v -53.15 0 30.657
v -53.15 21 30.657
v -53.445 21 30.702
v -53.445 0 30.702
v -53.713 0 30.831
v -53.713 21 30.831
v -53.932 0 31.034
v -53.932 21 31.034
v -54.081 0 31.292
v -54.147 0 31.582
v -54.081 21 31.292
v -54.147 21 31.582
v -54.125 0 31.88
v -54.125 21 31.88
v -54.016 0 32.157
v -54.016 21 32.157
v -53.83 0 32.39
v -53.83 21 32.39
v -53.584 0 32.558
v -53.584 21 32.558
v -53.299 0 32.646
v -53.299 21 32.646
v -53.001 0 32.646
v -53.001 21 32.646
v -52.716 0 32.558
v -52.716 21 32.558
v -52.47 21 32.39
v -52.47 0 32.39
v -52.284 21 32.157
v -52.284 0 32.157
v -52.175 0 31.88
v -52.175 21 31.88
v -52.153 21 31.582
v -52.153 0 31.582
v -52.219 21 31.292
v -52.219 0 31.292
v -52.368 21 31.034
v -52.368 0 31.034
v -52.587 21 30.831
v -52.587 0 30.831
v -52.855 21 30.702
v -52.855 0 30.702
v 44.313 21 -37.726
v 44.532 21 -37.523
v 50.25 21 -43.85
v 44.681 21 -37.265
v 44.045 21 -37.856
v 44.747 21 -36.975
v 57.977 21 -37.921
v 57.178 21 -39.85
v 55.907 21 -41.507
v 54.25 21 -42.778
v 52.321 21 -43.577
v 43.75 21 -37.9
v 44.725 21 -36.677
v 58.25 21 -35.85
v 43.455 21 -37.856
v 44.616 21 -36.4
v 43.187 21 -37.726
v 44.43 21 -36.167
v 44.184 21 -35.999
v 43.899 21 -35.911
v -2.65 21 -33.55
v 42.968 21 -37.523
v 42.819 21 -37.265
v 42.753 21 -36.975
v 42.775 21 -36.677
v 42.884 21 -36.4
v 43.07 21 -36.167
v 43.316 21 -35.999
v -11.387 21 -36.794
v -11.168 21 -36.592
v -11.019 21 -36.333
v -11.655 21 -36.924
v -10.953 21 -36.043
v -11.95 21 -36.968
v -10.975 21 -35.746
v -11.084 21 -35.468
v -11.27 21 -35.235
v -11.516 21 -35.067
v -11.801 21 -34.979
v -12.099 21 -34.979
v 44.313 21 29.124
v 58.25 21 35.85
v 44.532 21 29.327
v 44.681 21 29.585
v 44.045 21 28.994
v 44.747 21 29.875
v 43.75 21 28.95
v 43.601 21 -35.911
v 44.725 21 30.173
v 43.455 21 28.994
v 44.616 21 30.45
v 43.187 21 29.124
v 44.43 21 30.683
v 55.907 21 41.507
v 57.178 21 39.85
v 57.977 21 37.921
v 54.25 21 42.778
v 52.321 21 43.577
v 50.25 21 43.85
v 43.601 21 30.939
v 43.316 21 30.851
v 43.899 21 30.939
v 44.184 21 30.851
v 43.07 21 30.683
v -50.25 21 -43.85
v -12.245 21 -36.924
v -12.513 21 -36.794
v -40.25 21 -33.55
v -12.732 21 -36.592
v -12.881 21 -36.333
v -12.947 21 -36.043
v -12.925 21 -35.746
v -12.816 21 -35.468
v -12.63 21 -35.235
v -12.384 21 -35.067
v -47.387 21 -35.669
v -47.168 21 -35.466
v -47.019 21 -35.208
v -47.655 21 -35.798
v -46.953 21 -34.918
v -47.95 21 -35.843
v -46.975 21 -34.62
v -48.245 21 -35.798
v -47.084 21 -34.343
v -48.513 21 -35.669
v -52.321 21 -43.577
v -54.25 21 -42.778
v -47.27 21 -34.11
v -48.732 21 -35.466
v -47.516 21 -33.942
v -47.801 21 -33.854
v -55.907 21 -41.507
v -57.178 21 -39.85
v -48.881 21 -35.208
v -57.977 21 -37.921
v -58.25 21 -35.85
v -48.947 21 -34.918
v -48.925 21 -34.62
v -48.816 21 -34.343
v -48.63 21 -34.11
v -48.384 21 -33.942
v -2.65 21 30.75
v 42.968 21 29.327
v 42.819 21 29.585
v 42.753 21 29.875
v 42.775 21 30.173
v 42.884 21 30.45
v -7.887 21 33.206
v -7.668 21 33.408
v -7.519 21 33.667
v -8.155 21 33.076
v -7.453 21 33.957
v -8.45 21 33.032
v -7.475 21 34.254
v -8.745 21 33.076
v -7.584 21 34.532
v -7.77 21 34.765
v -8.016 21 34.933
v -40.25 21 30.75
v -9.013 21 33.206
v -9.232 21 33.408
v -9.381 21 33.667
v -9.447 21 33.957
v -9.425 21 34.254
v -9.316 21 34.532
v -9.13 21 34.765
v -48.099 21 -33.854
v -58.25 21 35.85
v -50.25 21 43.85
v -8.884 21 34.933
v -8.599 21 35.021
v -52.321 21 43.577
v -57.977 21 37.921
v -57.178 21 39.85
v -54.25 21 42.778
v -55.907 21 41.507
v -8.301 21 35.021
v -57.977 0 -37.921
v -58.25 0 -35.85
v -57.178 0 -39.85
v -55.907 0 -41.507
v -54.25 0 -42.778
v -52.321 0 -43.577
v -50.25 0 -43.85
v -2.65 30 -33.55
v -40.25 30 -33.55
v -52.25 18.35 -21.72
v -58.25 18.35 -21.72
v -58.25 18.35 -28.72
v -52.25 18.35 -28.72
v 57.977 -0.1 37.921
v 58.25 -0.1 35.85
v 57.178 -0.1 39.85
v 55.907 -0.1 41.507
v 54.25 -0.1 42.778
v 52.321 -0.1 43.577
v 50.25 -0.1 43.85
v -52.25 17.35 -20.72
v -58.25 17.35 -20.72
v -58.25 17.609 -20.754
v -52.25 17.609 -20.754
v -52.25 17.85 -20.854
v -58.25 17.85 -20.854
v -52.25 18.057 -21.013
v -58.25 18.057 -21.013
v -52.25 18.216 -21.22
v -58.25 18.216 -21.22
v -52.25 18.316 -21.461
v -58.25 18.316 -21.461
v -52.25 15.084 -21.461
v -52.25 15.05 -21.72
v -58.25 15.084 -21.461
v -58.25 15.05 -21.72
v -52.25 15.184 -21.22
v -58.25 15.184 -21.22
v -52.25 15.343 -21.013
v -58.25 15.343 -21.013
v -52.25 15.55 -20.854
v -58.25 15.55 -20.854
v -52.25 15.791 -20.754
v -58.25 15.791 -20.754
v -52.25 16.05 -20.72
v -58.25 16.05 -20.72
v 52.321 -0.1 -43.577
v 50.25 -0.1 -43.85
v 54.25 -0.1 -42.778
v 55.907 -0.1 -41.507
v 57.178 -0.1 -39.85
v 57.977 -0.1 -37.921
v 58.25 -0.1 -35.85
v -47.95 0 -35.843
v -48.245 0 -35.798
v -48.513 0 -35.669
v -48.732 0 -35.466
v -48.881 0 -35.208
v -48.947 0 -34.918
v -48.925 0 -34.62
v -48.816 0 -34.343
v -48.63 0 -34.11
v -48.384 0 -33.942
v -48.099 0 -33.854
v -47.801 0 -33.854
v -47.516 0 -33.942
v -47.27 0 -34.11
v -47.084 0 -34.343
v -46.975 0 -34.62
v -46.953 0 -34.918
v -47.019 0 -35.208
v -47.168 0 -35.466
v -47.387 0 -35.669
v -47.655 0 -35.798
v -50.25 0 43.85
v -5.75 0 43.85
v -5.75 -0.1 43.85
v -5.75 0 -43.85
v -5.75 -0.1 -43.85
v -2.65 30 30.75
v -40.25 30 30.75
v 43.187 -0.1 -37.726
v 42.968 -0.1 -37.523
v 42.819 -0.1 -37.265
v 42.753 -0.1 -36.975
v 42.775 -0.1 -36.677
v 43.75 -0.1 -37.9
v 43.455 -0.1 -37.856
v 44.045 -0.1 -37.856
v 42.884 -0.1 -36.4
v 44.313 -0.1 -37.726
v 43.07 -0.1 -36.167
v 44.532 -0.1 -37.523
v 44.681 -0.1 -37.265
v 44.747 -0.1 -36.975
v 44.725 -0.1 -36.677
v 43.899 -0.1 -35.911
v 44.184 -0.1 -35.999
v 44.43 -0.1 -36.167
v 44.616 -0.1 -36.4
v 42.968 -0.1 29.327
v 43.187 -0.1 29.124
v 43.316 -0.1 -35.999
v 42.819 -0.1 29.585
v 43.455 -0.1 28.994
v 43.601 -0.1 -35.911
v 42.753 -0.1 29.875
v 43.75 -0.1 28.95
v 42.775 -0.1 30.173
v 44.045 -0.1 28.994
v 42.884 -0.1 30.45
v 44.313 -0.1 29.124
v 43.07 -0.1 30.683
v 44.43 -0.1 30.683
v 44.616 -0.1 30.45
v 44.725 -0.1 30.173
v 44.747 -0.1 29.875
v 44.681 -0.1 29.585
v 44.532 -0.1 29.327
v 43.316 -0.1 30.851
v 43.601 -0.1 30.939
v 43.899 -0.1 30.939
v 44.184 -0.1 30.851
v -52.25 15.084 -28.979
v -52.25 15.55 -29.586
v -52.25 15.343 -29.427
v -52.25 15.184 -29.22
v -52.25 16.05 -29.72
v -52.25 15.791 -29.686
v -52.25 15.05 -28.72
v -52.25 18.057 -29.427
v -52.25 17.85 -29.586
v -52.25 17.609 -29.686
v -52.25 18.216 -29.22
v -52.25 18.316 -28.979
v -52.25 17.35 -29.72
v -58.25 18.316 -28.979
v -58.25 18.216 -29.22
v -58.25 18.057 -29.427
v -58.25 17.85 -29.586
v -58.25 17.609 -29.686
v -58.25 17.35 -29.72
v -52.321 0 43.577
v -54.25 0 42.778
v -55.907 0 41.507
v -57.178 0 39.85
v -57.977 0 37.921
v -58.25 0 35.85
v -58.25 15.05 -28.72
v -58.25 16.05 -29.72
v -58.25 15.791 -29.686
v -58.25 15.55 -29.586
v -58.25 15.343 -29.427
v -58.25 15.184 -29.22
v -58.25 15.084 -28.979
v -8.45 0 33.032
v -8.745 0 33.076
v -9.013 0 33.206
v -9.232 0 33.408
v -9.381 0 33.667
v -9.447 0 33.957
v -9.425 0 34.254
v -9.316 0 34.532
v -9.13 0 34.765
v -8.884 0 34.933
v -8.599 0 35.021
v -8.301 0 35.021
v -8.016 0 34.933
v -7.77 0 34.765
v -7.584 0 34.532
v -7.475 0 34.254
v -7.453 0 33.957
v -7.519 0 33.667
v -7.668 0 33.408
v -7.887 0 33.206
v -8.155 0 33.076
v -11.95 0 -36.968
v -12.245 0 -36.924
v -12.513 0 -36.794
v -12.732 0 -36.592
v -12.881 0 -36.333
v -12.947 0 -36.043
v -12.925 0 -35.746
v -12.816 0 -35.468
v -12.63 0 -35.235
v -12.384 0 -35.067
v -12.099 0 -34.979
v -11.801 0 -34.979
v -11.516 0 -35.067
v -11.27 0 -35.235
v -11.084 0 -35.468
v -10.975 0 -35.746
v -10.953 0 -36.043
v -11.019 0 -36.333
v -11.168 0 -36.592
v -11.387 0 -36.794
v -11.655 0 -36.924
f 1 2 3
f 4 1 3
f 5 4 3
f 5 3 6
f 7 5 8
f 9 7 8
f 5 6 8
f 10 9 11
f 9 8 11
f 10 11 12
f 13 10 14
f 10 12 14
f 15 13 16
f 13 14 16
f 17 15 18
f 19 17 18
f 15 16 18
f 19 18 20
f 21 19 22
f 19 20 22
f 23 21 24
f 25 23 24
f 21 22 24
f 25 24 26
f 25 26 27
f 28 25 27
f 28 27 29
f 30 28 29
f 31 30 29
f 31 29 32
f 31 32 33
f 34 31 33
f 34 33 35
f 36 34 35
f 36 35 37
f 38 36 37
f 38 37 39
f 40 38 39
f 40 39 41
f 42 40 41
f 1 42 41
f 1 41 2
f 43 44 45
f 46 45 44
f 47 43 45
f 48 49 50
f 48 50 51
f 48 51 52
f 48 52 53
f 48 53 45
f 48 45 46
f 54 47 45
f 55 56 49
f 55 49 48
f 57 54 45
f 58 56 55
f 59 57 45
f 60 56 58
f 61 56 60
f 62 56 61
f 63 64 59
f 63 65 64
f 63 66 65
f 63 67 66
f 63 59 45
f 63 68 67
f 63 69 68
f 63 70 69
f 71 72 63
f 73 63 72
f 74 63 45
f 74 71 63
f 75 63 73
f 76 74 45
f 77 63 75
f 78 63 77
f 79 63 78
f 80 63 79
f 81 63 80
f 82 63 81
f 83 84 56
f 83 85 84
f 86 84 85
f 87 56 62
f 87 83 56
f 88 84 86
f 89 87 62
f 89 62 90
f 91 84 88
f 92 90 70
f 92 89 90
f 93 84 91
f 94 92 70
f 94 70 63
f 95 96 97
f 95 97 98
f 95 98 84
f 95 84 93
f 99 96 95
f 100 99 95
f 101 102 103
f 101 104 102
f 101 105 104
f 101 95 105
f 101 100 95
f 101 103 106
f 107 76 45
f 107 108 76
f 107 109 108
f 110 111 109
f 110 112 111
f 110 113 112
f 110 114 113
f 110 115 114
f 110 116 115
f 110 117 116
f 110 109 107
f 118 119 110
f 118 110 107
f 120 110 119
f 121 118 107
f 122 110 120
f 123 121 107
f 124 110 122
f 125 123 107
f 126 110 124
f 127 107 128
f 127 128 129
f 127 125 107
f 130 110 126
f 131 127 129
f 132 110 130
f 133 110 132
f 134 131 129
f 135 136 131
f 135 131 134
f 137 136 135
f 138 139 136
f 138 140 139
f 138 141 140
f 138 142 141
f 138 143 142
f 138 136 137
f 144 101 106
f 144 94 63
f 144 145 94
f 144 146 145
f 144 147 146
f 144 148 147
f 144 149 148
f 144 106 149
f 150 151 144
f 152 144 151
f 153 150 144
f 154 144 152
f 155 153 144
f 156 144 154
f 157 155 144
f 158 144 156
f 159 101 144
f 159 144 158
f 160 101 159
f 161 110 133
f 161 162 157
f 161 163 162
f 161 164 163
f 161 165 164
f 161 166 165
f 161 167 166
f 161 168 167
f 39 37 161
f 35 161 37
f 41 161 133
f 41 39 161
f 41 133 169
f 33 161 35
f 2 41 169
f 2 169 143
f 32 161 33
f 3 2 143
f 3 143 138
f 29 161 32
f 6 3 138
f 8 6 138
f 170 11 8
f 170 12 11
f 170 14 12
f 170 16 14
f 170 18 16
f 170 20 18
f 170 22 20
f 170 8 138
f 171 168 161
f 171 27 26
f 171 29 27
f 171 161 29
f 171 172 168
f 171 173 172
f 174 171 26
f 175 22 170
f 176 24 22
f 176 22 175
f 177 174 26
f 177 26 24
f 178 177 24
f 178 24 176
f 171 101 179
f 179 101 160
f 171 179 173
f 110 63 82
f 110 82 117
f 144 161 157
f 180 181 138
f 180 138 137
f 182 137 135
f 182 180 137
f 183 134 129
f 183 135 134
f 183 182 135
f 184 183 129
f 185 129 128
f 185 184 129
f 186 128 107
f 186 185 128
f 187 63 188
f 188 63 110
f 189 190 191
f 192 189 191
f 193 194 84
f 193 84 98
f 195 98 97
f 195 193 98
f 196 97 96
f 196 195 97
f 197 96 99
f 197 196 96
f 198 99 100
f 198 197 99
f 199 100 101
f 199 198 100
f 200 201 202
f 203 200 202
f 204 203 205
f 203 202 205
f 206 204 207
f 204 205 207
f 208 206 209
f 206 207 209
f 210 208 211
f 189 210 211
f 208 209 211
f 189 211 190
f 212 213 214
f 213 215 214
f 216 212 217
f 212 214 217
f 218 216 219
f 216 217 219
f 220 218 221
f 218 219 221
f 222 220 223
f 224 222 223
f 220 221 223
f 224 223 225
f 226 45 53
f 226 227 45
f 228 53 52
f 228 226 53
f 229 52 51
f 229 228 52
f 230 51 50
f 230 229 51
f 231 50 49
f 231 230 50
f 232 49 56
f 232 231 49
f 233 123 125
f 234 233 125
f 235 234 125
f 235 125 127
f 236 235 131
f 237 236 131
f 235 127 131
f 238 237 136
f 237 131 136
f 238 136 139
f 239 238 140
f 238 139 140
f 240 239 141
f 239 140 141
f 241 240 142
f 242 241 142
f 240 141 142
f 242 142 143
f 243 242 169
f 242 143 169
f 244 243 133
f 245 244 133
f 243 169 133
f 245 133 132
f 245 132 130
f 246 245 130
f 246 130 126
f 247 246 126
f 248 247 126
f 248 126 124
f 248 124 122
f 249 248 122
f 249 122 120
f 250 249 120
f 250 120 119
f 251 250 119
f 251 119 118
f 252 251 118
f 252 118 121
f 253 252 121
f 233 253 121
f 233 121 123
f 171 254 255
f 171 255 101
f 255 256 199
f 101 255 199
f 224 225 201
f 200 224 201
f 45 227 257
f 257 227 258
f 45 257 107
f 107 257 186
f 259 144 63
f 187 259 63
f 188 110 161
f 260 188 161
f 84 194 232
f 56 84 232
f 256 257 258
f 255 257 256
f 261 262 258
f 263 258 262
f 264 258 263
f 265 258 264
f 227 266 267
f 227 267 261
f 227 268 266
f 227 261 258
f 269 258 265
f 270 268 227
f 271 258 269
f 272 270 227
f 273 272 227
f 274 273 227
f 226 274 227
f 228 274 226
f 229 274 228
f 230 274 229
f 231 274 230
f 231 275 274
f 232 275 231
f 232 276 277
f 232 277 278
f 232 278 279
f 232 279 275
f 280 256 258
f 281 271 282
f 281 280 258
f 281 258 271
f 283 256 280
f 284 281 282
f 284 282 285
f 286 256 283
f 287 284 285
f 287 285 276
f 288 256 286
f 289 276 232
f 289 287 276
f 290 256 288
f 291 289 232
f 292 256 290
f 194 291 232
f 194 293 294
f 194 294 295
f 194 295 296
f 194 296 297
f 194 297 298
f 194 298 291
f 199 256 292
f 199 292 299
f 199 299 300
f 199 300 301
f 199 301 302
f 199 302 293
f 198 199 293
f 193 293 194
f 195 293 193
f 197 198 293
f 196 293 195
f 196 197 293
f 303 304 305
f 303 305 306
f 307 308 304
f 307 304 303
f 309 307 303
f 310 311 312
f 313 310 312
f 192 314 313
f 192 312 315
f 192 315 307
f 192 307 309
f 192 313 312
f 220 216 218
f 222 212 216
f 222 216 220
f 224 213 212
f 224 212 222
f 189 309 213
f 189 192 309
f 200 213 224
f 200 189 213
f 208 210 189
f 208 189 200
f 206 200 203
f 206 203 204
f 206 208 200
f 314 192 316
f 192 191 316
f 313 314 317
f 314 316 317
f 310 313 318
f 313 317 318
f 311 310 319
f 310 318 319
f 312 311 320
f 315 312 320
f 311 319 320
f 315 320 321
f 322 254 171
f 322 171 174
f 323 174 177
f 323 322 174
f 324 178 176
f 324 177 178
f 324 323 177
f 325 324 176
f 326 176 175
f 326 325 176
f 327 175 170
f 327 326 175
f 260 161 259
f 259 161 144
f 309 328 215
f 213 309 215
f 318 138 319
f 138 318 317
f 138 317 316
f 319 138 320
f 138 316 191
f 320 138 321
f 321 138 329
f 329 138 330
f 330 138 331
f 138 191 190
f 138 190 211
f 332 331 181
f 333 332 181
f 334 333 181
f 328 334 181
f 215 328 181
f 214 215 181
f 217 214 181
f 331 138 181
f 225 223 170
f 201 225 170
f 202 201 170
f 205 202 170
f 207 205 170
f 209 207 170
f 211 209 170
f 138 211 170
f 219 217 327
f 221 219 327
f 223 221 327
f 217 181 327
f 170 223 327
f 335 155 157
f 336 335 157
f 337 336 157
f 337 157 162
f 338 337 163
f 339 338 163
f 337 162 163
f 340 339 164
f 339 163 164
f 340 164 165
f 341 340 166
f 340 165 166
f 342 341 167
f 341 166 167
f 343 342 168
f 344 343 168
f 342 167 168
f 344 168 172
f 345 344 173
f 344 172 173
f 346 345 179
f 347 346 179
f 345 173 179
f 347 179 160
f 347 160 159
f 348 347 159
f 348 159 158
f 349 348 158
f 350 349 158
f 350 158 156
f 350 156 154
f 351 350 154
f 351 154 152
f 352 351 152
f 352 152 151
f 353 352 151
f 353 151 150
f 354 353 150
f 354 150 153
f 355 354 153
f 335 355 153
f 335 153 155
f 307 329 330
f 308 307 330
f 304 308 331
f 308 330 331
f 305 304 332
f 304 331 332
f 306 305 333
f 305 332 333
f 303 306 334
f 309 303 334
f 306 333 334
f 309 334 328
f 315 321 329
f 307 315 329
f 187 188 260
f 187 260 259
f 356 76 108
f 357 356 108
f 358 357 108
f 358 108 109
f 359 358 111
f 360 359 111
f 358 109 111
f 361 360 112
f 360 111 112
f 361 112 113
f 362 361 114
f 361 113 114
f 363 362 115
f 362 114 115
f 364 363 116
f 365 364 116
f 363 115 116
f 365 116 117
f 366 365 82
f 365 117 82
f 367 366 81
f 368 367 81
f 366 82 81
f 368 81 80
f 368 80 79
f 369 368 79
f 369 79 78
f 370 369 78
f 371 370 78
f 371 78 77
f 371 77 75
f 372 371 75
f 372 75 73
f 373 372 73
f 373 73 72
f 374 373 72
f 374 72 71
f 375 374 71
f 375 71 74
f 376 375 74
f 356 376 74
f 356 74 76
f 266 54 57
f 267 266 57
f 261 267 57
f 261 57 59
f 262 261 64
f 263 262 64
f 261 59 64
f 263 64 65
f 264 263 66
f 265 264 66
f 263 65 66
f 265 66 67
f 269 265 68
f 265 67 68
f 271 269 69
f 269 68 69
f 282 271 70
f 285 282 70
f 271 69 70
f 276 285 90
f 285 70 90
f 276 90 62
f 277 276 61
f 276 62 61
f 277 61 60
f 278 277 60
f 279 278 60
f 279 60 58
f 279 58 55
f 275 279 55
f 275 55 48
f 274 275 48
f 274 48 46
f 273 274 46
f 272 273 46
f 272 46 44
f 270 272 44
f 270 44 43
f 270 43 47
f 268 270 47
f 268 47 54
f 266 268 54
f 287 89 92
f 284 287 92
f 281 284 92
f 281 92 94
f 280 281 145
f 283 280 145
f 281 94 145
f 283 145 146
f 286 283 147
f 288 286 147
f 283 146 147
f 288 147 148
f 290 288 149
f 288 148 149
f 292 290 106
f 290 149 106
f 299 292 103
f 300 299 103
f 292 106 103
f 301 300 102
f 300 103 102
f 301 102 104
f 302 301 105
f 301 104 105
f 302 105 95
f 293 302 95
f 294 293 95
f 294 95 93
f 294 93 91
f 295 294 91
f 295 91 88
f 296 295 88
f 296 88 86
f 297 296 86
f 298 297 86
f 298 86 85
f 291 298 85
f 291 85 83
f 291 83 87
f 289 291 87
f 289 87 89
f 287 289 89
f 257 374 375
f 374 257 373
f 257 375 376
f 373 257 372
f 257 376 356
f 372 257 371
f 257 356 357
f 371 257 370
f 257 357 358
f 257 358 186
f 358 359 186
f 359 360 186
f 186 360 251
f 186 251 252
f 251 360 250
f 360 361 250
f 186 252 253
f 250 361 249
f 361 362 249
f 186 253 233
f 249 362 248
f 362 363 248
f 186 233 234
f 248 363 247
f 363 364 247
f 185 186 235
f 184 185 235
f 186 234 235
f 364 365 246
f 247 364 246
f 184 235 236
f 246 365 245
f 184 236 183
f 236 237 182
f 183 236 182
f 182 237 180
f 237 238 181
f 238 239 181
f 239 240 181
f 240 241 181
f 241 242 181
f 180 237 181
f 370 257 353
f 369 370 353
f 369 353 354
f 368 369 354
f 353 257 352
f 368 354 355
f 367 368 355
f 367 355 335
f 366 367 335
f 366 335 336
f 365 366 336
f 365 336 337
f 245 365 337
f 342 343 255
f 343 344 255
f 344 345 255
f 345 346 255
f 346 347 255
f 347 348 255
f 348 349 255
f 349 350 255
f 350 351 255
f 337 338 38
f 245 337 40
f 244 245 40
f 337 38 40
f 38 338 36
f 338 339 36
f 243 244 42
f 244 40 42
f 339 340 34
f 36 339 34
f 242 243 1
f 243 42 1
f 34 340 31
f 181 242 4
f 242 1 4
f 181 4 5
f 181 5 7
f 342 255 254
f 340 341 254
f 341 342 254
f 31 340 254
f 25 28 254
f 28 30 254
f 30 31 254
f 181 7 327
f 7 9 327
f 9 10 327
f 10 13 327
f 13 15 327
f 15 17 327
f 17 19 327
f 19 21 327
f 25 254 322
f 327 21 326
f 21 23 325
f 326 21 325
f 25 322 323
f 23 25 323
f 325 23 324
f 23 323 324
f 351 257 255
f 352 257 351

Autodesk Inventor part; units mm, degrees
ref_plane "YZ Plane" through (0, 0, 0) normal (1, 0, 0) x (0, 1, 0)
ref_plane "XZ Plane" through (0, 0, 0) normal (0, 1, 0) x (-1, 0, 0)
ref_plane "XY Plane" through (0, 0, 0) normal (0, 0, 1) x (1, 0, 0)
sketch "Skizze1" plane through (0, 0, 0) normal (0, 1, 0) x (-1, 0, 0)
  line L0 (50.25, 43.85) -> (-50.25, 43.85)
  line L1 (-58.25, 35.85) -> (-58.25, -35.85)
  line L2 (-50.25, -43.85) -> (50.25, -43.85)
  line L3 (58.25, -35.85) -> (58.25, 35.85)
  line L4 (58.25, 43.85) -> (-58.25, -43.85) construction
  line L5 (-58.25, 43.85) -> (58.25, -43.85) construction
  arc A0 (58.25, 35.85) -> (50.25, 43.85) centre (50.25, 35.85) ccw
  arc A1 (50.25, -43.85) -> (58.25, -35.85) centre (50.25, -35.85) ccw
  arc A2 (-58.25, -35.85) -> (-50.25, -43.85) centre (-50.25, -35.85) ccw
  arc A3 (-50.25, 43.85) -> (-58.25, 35.85) centre (-50.25, 35.85) ccw
  point P0 (0, 0)
  dimension "d0" = 116.5
  dimension "d1" = 87.7
  dimension "d2" = 8
extrude "Extrusion1" add sketch "Skizze1" along normal blind 21
sketch "Skizze2" plane through (0, 0, 0) normal (0, -1, 0) x (1, 0, 0)
  arc A0 (58.25, 35.85) -> (50.25, 43.85) centre (50.25, 35.85) ccw projected
  line L0 (-50.25, 43.85) -> (50.25, 43.85) projected
  arc A1 (-50.25, 43.85) -> (-58.25, 35.85) centre (-50.25, 35.85) ccw projected
  line L1 (-58.25, -35.85) -> (-58.25, 35.85) projected
  arc A2 (-58.25, -35.85) -> (-50.25, -43.85) centre (-50.25, -35.85) ccw projected
  line L2 (50.25, -43.85) -> (-50.25, -43.85) projected
  arc A3 (50.25, -43.85) -> (58.25, -35.85) centre (50.25, -35.85) ccw projected
  line L3 (58.25, 35.85) -> (58.25, -35.85) projected
  line L4 (50.25, -43.85) -> (-50.25, -43.85) projected
  line L5 (-5.75, -43.85) -> (-5.75, 43.85)
  point P0 (0, 0)
  dimension "d5" = 64
extrude "Extrusion2" add sketch "Skizze2" along normal blind 0.1 contours L3 A3 L2 L5 L0 A0
sketch "Skizze3" plane through (0, 21, 0) normal (0, 1, 0) x (1, 0, 0)
  line L0 (-40.25, -30.75) -> (-2.65, -30.75)
  line L1 (-2.65, -30.75) -> (-2.65, 33.55)
  line L2 (-2.65, 33.55) -> (-40.25, 33.55)
  line L3 (-40.25, 33.55) -> (-40.25, -30.75)
  line L4 (-40.25, -30.75) -> (-2.65, 33.55) construction
  line L5 (-2.65, -30.75) -> (-40.25, 33.55) construction
  line L6 (-50.25, -43.85) -> (50.25, -43.85) projected
  line L7 (50.25, 43.85) -> (-50.25, 43.85) projected
  line L8 (-58.25, 35.85) -> (-58.25, -35.85) projected
  point P0 (0, 0)
  point P1 (-21.45, 1.4)
  dimension "d8" = 37.6
  dimension "d9" = 64.3
  dimension "d10" = 13.1
  dimension "d11" = 10.3
  dimension "d12" = 18
extrude "Extrusion3" add sketch "Skizze3" along normal blind 9
sketch "Skizze4" plane through (0, -0.1, 0) normal (0, -1, 0) x (1, 0, 0)
  line L0 (50.25, 43.85) -> (-5.75, 43.85) projected
  line L1 (-5.75, 43.85) -> (-5.75, -43.85) projected
  line L2 (-5.75, -43.85) -> (50.25, -43.85) projected
  arc A0 (50.25, -43.85) -> (58.25, -35.85) centre (50.25, -35.85) ccw projected
  line L3 (58.25, -35.85) -> (58.25, 35.85) projected
  arc A1 (58.25, 35.85) -> (50.25, 43.85) centre (50.25, 35.85) ccw projected
  line L4 (-5.75, -43.85) -> (-5.75, 43.85) projected
  line L5 (-50.25, 43.85) -> (-5.75, 43.85) projected
  arc A2 (-50.25, 43.85) -> (-58.25, 35.85) centre (-50.25, 35.85) ccw projected
  line L6 (-58.25, -35.85) -> (-58.25, 35.85) projected
  arc A3 (-58.25, -35.85) -> (-50.25, -43.85) centre (-50.25, -35.85) ccw projected
  line L7 (-5.75, -43.85) -> (-50.25, -43.85) projected
  circle A4 centre (43.75, -36.9) radius 1.1
  circle A5 centre (43.75, 29.95) radius 1.1
  circle A6 centre (-11.95, -35.9681) radius 1.1
  circle A7 centre (-8.45, 34.0319) radius 1.1
  circle A8 centre (-47.95, -34.8429) radius 1.1
  circle A9 centre (-53.15, 31.6571) radius 1.1
  point P0 (0, 0)
  dimension "d15" = 2.2
  dimension "d16" = 2.2
  dimension "d17" = 2.2
  dimension "d18" = 2.2
  dimension "d19" = 2.2
  dimension "d20" = 2.2
  dimension "d21" = 0
  dimension "d22" = 66.85
  dimension "d23" = 70
  dimension "d24" = 66.5
  dimension "d25" = 52.2
  dimension "d26" = 44.7
  dimension "d27" = 36
  dimension "d28" = 55.7
  dimension "d29" = 118.7
  dimension "d30" = 112.2809
  dimension "d31" = 86.3
  dimension "d32" = 88.0691
  dimension "d33" = 79.3976
  dimension "d34" = 13.9
  dimension "d35" = 6.95
  dimension "d36" = 14.5
  dimension "d37" = 9.8181
  dimension "d38" = 7.8819
  dimension "d39" = 9.0071
  dimension "d40" = 12.1929
  dimension "d41" = 5.1
hole "Bohrung1" at (-11.95, -0.1, -35.9681) at (-47.95, -0.1, -34.8429) at (-53.15, -0.1, 31.6571) at (-8.45, -0.1, 34.0319) at (43.75, -0.1, 29.95) at (43.75, -0.1, -36.9) direction (0, 1, 0) diameter 2 end through all
sketch "Skizze5" plane through (-58.25, 0, -35.85) normal (-1, 0, 0) x (0, 0, 1)
  line L0 (0, 0) -> (71.7, 0) projected
  line L1 (71.7, 0) -> (71.7, 21) projected
  line L2 (0, 21) -> (71.7, 21) projected
  line L3 (0, 0) -> (0, 21) projected
  line L4 (14.13, 18.35) -> (7.13, 18.35)
  line L5 (6.13, 17.35) -> (6.13, 16.05)
  line L6 (7.13, 15.05) -> (14.13, 15.05)
  line L7 (15.13, 16.05) -> (15.13, 17.35)
  arc A0 (15.13, 17.35) -> (14.13, 18.35) centre (14.13, 17.35) ccw
  arc A1 (14.13, 15.05) -> (15.13, 16.05) centre (14.13, 16.05) ccw
  arc A2 (6.13, 16.05) -> (7.13, 15.05) centre (7.13, 16.05) ccw
  arc A3 (7.13, 18.35) -> (6.13, 17.35) centre (7.13, 17.35) ccw
  line L8 (-8, 0) -> (0, 0) projected
  line L9 (0, 0) -> (0, 21) projected
  line L10 (-8, 21) -> (0, 21) projected
  line L11 (-8, 0) -> (-8, 21) projected
  point P0 (35.85, 0)
  point P1 (6.13, 15.05)
  point P2 (6.13, 18.35)
  point P3 (15.13, 15.05)
  point P4 (6.13, 16.7)
  dimension "d49" = 9
  dimension "d50" = 3.3
  dimension "d51" = 1
  dimension "d52" = 15.05
  dimension "d53" = 14.13
extrude "Extrusion4" cut sketch "Skizze5" against normal blind 6 contours A0 L7 A1 L6 A2 L5 A3 L4
equation "\"d16\" = d15"
equation "\"d17\" = d15"
equation "\"d18\" = d15"
equation "\"d19\" = d15"
equation "\"d20\" = d15"
properties part number "Isdt"
